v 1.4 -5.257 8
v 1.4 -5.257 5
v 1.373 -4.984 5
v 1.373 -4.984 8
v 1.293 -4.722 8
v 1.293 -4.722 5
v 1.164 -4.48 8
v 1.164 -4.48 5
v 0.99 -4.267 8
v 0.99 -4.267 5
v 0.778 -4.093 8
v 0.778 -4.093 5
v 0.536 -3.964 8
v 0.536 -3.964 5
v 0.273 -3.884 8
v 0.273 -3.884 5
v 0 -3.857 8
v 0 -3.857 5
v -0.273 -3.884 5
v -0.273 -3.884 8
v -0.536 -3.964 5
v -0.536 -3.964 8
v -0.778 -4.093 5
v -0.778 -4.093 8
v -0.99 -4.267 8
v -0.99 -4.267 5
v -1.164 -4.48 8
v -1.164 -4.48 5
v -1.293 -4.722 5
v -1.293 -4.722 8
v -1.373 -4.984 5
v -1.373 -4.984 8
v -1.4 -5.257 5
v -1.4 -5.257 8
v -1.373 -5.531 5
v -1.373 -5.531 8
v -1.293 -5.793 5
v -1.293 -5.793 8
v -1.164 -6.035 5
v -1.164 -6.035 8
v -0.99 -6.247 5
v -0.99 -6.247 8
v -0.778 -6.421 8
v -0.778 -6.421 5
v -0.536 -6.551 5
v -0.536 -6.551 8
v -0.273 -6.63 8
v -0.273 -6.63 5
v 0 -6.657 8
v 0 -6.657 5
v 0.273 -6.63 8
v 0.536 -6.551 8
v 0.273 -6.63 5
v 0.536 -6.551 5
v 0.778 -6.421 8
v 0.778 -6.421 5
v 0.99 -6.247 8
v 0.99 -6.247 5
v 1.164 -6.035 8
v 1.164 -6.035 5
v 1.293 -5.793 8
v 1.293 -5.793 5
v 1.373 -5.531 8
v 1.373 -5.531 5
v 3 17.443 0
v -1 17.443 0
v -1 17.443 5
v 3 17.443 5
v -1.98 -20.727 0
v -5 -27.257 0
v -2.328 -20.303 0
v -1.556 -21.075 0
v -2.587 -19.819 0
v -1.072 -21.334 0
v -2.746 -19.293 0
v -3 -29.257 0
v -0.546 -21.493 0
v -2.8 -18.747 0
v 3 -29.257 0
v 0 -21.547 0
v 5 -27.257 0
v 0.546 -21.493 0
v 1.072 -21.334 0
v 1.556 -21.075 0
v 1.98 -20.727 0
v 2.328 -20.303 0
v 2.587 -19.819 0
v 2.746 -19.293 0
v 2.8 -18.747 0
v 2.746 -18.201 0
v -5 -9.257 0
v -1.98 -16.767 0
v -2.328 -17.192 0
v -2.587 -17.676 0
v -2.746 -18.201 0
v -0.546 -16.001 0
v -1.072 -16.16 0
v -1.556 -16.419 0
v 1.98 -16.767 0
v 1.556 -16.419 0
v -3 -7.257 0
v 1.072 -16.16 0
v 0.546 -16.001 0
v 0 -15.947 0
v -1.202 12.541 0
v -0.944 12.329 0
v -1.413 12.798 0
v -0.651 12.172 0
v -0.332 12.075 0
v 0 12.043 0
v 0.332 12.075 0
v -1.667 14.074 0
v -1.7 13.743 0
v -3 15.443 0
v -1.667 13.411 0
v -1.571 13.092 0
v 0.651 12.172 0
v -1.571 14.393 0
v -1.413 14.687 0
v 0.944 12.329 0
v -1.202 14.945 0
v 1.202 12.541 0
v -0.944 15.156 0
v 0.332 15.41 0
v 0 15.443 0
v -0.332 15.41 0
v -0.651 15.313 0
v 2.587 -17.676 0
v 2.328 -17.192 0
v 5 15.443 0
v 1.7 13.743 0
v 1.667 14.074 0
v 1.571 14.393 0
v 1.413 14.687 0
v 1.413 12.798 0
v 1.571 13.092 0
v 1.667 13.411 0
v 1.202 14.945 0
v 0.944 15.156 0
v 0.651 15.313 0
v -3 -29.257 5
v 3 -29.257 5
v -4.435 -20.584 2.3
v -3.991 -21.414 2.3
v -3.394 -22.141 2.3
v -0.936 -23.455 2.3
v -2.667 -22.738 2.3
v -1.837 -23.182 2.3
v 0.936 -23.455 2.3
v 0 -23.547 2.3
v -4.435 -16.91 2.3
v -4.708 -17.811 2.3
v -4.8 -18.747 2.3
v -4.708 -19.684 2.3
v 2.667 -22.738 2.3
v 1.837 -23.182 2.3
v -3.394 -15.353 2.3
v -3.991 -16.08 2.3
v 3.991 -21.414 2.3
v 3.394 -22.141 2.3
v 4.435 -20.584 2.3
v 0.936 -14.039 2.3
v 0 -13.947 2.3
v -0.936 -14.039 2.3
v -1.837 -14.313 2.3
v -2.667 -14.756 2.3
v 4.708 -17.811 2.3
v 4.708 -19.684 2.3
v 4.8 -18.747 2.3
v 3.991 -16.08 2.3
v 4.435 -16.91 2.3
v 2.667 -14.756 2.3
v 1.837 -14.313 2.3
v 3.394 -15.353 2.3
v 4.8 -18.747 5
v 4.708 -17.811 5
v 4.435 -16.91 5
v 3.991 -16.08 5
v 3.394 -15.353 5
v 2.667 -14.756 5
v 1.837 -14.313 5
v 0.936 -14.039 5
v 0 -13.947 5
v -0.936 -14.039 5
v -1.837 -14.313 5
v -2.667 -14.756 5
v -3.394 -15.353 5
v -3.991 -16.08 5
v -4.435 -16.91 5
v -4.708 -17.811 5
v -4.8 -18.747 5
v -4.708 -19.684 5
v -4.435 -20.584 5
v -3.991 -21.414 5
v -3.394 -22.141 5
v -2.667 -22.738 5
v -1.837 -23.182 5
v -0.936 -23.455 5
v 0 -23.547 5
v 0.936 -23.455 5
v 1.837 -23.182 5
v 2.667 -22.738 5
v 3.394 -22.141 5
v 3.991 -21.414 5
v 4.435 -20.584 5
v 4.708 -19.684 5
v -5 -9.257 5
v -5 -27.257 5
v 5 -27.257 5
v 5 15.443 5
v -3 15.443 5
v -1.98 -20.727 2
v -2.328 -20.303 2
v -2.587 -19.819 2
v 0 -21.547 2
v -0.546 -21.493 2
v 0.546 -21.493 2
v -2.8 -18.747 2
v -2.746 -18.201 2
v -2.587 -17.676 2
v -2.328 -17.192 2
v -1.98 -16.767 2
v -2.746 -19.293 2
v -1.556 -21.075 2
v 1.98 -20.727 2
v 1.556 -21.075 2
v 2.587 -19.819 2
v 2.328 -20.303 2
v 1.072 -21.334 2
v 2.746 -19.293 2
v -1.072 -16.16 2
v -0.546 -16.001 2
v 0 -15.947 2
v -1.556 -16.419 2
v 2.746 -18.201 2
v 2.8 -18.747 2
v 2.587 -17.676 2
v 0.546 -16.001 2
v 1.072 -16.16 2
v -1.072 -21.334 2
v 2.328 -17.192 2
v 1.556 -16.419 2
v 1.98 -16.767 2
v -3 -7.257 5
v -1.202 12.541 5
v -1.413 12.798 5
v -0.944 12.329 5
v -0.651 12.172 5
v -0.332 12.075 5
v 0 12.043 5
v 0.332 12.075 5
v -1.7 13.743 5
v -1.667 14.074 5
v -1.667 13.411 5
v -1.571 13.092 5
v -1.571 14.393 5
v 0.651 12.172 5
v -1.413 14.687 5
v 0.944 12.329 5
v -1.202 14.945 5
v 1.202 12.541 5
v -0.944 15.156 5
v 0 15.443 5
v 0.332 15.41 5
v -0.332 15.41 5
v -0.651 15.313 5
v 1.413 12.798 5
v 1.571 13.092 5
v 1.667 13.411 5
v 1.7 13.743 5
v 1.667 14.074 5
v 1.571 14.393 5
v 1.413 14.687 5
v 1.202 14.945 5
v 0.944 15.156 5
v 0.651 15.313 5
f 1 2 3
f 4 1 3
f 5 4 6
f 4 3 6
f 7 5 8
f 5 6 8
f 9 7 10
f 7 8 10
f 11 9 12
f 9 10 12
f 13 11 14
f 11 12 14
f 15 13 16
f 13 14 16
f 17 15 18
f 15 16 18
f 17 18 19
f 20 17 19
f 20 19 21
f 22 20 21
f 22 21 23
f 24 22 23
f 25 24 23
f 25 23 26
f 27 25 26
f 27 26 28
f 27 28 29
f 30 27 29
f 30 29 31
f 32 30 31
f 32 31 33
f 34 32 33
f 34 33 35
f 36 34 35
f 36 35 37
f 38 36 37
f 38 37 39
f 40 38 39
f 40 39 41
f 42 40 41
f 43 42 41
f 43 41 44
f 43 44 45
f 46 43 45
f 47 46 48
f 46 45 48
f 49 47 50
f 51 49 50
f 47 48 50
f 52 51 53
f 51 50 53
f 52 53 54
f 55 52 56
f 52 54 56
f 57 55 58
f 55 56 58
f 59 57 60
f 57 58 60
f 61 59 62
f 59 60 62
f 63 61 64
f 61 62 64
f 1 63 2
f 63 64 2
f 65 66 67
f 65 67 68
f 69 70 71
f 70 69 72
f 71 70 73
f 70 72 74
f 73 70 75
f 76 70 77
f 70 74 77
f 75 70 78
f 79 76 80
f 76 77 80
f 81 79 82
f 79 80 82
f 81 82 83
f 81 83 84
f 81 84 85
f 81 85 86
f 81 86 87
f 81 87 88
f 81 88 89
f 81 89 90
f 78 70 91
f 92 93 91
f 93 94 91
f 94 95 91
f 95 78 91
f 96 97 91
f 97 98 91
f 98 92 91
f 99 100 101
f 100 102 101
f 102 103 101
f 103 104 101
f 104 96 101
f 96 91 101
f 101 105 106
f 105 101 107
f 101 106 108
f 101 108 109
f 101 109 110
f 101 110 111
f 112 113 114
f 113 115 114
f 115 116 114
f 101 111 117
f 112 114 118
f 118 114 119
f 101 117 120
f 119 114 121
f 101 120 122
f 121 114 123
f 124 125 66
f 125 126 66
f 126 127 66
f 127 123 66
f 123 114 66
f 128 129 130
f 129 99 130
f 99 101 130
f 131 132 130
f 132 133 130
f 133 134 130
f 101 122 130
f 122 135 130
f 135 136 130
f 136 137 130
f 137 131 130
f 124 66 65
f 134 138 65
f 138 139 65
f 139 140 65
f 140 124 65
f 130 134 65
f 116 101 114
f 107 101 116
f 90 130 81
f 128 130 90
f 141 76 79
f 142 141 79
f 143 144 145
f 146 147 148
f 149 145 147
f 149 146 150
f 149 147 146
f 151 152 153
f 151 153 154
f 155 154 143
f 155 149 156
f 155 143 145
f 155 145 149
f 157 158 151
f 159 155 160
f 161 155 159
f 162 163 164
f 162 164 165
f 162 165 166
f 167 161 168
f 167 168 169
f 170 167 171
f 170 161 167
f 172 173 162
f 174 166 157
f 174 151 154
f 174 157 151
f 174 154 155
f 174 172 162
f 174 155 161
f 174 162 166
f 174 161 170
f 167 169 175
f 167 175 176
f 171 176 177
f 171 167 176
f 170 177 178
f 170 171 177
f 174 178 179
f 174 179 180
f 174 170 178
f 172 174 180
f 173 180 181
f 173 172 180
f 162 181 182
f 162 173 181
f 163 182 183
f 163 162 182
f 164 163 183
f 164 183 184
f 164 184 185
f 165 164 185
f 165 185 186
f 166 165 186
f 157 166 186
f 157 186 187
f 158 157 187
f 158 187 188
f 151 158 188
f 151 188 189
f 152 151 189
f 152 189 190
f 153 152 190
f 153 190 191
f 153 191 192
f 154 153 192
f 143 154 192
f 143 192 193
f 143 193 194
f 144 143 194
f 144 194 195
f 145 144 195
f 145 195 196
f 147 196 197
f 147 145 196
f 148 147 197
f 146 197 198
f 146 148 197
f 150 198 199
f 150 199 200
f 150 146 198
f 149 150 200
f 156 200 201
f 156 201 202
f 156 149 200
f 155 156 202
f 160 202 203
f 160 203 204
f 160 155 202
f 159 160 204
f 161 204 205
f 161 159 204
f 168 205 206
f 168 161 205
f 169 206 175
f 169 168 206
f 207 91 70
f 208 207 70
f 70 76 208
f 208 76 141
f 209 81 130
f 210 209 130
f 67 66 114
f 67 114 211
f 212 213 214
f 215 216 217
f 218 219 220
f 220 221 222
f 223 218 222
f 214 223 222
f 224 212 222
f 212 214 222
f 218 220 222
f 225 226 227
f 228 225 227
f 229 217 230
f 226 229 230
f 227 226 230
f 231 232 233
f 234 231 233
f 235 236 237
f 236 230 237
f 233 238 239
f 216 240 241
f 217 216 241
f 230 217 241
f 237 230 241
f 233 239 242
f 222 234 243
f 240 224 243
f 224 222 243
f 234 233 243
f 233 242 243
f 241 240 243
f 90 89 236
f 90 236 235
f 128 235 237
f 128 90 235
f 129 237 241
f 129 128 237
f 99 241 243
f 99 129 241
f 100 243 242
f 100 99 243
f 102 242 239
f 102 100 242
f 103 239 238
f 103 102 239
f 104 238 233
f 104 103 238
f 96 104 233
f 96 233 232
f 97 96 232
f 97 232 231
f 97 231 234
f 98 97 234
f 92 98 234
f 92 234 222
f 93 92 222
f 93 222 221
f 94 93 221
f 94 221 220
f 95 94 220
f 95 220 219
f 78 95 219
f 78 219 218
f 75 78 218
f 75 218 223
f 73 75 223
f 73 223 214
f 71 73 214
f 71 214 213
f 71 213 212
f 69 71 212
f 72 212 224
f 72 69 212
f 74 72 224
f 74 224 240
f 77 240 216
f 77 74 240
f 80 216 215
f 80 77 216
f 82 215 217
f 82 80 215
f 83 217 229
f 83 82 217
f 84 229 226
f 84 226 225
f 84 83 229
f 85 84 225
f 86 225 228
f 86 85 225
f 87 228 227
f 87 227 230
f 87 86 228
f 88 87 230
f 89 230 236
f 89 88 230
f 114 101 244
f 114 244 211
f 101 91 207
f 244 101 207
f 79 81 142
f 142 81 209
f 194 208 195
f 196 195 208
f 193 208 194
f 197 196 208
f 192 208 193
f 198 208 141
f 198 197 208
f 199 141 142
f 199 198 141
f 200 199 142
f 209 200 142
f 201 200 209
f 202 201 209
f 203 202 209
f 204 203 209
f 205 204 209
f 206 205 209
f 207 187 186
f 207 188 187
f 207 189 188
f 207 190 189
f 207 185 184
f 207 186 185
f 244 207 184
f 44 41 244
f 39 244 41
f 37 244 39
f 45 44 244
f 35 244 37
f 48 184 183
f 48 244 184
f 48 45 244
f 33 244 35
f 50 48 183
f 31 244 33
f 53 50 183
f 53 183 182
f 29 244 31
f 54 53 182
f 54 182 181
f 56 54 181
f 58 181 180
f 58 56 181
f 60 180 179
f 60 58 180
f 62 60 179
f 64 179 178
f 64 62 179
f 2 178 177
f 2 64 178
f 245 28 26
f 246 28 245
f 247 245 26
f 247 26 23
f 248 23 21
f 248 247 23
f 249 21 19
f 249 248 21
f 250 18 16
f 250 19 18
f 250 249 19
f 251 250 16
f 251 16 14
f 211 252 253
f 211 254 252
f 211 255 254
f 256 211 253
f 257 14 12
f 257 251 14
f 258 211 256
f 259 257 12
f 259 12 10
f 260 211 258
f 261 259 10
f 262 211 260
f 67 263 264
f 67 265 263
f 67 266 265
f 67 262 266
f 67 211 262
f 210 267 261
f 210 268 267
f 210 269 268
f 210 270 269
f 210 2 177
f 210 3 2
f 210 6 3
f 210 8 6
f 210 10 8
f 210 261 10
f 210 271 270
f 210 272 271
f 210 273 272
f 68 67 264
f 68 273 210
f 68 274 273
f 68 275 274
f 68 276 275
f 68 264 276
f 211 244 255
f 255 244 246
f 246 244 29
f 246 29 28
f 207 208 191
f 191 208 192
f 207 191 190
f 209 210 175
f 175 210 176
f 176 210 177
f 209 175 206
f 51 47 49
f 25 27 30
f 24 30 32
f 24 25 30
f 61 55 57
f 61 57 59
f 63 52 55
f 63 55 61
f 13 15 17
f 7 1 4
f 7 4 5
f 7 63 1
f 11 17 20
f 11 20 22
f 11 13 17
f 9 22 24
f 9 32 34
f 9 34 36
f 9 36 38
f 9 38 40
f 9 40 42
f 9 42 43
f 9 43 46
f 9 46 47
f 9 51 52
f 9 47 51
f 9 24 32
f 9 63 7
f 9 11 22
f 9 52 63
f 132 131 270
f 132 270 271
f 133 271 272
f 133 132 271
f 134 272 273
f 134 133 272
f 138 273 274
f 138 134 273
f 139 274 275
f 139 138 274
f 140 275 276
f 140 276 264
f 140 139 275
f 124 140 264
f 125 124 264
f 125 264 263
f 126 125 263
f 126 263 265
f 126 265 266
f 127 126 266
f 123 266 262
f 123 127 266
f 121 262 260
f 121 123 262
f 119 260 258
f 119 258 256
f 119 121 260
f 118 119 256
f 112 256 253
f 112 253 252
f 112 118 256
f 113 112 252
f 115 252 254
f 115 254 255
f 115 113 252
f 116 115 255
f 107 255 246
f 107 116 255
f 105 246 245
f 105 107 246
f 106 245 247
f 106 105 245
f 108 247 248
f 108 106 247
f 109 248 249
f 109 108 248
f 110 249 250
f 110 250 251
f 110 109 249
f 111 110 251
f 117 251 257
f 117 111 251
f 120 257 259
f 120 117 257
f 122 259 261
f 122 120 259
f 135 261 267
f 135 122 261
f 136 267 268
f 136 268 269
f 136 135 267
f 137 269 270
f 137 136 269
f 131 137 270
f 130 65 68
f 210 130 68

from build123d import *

# Parameters (mm, degrees)
F0_W     = 8
F0_H     = 26.7
F0_R     = 1.4
F0_R_2   = 1.7
F0_R_3   = 4.8
F1_DEPTH = 5
F2_DEPTH = 8
F0_R_4   = 2.8
F3_DEPTH = 2.3
F4_START = 2
F4_DEPTH = 0.3
F5_SIZE  = 1.99999


# Not quite as in the source:
# - a fillet or chamfer is up to 0.001 mm smaller than in the source, because OpenCascade refuses the exact size


with BuildPart() as f1:
    # F0 (on Top) → F1 (new body)
    with BuildSketch(Plane.XY):
        with Locations((1, 4.0926239572)):
            Rectangle(F0_W, F0_H)
        with Locations((0, -5.2573760428)):
            Circle(F0_R, mode=Mode.SUBTRACT)
        with Locations((0, 13.7426239572)):
            Circle(F0_R_2, mode=Mode.SUBTRACT)
        Polygon((-5, -9.2573760428), (-5, -29.2573760428), (5, -29.2573760428), (5, -9.2573760428), (-3, -9.2573760428), align=None)
        with Locations((0, -18.7472271925)):
            Circle(F0_R_3, mode=Mode.SUBTRACT)
    extrude(amount=F1_DEPTH)

    # F0 (on Top) → F2 (join)
    with BuildSketch(Plane.XY):
        with Locations((0, -5.2573760428)):
            Circle(F0_R)
    extrude(amount=F2_DEPTH)

    # F0 (on Top) → F3 (join)
    with BuildSketch(Plane.XY):
        with Locations((0, -18.7472271925)):
            Circle(F0_R_3)
        with Locations((0, -18.7472271925)):
            Circle(F0_R_4, mode=Mode.SUBTRACT)
    extrude(amount=F3_DEPTH)

    # F0 (on Top) → F4 (join)
    with BuildSketch(Plane.XY.offset(F4_START)):
        with Locations((0, -18.7472271925)):
            Circle(F0_R_4)
    extrude(amount=F4_DEPTH)

    # F5 (size 2 in the source; OpenCascade refuses exactly that, so slightly less here)
    f5_edges = [f1.edges().sort_by_distance(p)[0] for p in [
        (-3, -9.257376, 2.5),
        (-3, 17.442624, 2.5),
        (5, 17.442624, 2.5),
        (5, -29.257376, 2.5),
        (-5, -29.257376, 2.5),
    ]]
    chamfer(f5_edges, length=F5_SIZE)


solid = f1.part
